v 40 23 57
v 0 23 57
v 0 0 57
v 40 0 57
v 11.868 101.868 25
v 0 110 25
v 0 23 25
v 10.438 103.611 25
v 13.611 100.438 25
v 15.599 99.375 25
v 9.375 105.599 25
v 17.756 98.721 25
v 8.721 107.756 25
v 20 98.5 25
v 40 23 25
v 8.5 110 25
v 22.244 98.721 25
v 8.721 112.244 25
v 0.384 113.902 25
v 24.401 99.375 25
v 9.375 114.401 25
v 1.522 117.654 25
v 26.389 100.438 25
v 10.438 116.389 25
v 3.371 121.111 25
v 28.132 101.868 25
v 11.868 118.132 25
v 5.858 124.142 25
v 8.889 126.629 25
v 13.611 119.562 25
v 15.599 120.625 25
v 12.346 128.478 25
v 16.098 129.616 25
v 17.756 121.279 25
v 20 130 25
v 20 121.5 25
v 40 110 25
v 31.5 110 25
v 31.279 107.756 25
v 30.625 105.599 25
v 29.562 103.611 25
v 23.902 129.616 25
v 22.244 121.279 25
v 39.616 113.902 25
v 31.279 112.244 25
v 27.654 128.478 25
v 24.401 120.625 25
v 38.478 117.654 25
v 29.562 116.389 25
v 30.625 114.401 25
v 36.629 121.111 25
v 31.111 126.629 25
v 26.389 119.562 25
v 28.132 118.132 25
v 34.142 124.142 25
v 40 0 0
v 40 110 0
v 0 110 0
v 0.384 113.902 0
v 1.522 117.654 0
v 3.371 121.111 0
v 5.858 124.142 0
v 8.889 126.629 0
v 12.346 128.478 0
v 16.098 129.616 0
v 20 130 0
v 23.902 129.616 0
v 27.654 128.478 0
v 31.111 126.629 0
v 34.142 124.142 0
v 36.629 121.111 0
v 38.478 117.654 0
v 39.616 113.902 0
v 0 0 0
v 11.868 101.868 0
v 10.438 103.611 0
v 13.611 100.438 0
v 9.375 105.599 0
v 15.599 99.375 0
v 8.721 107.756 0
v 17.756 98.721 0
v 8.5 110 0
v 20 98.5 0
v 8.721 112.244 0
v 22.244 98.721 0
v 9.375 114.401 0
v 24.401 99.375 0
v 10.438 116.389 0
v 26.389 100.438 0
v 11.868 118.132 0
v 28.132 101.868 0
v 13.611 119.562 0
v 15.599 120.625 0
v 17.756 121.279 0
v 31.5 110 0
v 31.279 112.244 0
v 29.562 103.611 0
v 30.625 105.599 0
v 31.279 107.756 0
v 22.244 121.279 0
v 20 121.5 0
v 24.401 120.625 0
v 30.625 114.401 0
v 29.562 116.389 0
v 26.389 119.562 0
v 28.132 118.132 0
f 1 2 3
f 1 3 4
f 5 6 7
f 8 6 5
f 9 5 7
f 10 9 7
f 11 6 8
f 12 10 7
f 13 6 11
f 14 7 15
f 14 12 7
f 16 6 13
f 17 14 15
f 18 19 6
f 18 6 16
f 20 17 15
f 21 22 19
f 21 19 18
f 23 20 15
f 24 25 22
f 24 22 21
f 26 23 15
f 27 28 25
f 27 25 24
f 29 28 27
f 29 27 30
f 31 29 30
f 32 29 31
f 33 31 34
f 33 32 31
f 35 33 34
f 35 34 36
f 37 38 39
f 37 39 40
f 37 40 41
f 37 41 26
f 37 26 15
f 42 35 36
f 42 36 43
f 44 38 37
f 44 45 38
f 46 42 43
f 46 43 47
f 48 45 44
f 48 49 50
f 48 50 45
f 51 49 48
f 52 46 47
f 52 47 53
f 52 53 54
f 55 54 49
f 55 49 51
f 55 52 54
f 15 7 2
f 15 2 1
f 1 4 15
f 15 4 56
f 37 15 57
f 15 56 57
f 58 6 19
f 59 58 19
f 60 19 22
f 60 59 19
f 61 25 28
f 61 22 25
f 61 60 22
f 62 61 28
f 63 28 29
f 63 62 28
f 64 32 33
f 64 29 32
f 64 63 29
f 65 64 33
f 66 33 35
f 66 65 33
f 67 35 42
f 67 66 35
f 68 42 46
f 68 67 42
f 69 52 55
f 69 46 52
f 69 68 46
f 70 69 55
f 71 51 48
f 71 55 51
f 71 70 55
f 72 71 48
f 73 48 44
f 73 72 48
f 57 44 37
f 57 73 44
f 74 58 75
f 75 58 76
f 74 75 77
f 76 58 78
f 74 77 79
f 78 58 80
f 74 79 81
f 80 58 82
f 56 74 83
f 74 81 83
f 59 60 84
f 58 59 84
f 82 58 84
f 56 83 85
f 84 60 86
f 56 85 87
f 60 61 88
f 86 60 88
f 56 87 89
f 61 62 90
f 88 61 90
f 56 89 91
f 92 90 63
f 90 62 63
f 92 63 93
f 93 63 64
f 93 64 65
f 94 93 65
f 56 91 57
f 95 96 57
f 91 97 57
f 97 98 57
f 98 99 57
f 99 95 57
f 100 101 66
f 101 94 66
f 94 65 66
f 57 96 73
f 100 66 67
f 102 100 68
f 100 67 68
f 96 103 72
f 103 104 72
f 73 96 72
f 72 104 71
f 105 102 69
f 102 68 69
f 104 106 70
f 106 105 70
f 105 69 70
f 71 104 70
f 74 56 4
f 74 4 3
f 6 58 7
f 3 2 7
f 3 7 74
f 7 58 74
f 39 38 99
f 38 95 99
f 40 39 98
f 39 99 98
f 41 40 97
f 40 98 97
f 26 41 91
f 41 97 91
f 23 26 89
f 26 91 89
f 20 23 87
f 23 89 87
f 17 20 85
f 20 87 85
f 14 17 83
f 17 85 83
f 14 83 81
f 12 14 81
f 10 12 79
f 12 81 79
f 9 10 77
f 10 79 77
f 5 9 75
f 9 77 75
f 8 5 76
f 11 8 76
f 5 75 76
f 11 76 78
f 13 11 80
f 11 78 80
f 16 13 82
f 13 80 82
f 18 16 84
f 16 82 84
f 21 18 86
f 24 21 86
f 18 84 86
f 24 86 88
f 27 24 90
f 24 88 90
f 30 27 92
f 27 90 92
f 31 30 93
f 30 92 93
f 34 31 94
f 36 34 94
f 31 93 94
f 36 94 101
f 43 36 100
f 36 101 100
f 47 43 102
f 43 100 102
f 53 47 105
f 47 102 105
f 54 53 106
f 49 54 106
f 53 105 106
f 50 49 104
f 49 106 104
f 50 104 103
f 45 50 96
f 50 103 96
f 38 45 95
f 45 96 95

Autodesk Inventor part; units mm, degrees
ref_plane "YZ Plane" through (0, 0, 0) normal (1, 0, 0) x (0, 1, 0)
ref_plane "XZ Plane" through (0, 0, 0) normal (0, 1, 0) x (-1, 0, 0)
ref_plane "XY Plane" through (0, 0, 0) normal (0, 0, 1) x (1, 0, 0)
sketch "Szkic1" plane through (0, 0, 0) normal (0, 0, 1) x (1, 0, 0)
  line L0 (0, 0) -> (40, 0)
  line L1 (40, 0) -> (40, 110)
  line L2 (40, 110) -> (0, 110)
  line L3 (0, 110) -> (0, 0)
  circle A0 centre (20, 110) radius 11.5
  circle A1 centre (20, 110) radius 20
  dimension "d0" = 40
  dimension "d1" = 110
  dimension "d2" = 23
extrude "Wyciągnięcie proste1" add sketch "Szkic1" along normal blind 25 contours L3 A1 L1 L0 | A1 L2 A0 | L2 A0 A1
sketch "Szkic2" plane through (0, 0, 25) normal (0, 0, 1) x (1, 0, 0)
  line L0 (0, 110) -> (0, 0) projected
  line L1 (0, 0) -> (0, 23)
  line L2 (0, 23) -> (40, 23)
  line L3 (40, 0) -> (40, 110) projected
  line L4 (40, 23) -> (40, 0)
  line L5 (40, 0) -> (0, 0)
  dimension "d5" = 23
  dimension "d6" = 40
extrude "Wyciągnięcie proste2" add sketch "Szkic2" along normal blind 32
properties part number "Podstawa"
